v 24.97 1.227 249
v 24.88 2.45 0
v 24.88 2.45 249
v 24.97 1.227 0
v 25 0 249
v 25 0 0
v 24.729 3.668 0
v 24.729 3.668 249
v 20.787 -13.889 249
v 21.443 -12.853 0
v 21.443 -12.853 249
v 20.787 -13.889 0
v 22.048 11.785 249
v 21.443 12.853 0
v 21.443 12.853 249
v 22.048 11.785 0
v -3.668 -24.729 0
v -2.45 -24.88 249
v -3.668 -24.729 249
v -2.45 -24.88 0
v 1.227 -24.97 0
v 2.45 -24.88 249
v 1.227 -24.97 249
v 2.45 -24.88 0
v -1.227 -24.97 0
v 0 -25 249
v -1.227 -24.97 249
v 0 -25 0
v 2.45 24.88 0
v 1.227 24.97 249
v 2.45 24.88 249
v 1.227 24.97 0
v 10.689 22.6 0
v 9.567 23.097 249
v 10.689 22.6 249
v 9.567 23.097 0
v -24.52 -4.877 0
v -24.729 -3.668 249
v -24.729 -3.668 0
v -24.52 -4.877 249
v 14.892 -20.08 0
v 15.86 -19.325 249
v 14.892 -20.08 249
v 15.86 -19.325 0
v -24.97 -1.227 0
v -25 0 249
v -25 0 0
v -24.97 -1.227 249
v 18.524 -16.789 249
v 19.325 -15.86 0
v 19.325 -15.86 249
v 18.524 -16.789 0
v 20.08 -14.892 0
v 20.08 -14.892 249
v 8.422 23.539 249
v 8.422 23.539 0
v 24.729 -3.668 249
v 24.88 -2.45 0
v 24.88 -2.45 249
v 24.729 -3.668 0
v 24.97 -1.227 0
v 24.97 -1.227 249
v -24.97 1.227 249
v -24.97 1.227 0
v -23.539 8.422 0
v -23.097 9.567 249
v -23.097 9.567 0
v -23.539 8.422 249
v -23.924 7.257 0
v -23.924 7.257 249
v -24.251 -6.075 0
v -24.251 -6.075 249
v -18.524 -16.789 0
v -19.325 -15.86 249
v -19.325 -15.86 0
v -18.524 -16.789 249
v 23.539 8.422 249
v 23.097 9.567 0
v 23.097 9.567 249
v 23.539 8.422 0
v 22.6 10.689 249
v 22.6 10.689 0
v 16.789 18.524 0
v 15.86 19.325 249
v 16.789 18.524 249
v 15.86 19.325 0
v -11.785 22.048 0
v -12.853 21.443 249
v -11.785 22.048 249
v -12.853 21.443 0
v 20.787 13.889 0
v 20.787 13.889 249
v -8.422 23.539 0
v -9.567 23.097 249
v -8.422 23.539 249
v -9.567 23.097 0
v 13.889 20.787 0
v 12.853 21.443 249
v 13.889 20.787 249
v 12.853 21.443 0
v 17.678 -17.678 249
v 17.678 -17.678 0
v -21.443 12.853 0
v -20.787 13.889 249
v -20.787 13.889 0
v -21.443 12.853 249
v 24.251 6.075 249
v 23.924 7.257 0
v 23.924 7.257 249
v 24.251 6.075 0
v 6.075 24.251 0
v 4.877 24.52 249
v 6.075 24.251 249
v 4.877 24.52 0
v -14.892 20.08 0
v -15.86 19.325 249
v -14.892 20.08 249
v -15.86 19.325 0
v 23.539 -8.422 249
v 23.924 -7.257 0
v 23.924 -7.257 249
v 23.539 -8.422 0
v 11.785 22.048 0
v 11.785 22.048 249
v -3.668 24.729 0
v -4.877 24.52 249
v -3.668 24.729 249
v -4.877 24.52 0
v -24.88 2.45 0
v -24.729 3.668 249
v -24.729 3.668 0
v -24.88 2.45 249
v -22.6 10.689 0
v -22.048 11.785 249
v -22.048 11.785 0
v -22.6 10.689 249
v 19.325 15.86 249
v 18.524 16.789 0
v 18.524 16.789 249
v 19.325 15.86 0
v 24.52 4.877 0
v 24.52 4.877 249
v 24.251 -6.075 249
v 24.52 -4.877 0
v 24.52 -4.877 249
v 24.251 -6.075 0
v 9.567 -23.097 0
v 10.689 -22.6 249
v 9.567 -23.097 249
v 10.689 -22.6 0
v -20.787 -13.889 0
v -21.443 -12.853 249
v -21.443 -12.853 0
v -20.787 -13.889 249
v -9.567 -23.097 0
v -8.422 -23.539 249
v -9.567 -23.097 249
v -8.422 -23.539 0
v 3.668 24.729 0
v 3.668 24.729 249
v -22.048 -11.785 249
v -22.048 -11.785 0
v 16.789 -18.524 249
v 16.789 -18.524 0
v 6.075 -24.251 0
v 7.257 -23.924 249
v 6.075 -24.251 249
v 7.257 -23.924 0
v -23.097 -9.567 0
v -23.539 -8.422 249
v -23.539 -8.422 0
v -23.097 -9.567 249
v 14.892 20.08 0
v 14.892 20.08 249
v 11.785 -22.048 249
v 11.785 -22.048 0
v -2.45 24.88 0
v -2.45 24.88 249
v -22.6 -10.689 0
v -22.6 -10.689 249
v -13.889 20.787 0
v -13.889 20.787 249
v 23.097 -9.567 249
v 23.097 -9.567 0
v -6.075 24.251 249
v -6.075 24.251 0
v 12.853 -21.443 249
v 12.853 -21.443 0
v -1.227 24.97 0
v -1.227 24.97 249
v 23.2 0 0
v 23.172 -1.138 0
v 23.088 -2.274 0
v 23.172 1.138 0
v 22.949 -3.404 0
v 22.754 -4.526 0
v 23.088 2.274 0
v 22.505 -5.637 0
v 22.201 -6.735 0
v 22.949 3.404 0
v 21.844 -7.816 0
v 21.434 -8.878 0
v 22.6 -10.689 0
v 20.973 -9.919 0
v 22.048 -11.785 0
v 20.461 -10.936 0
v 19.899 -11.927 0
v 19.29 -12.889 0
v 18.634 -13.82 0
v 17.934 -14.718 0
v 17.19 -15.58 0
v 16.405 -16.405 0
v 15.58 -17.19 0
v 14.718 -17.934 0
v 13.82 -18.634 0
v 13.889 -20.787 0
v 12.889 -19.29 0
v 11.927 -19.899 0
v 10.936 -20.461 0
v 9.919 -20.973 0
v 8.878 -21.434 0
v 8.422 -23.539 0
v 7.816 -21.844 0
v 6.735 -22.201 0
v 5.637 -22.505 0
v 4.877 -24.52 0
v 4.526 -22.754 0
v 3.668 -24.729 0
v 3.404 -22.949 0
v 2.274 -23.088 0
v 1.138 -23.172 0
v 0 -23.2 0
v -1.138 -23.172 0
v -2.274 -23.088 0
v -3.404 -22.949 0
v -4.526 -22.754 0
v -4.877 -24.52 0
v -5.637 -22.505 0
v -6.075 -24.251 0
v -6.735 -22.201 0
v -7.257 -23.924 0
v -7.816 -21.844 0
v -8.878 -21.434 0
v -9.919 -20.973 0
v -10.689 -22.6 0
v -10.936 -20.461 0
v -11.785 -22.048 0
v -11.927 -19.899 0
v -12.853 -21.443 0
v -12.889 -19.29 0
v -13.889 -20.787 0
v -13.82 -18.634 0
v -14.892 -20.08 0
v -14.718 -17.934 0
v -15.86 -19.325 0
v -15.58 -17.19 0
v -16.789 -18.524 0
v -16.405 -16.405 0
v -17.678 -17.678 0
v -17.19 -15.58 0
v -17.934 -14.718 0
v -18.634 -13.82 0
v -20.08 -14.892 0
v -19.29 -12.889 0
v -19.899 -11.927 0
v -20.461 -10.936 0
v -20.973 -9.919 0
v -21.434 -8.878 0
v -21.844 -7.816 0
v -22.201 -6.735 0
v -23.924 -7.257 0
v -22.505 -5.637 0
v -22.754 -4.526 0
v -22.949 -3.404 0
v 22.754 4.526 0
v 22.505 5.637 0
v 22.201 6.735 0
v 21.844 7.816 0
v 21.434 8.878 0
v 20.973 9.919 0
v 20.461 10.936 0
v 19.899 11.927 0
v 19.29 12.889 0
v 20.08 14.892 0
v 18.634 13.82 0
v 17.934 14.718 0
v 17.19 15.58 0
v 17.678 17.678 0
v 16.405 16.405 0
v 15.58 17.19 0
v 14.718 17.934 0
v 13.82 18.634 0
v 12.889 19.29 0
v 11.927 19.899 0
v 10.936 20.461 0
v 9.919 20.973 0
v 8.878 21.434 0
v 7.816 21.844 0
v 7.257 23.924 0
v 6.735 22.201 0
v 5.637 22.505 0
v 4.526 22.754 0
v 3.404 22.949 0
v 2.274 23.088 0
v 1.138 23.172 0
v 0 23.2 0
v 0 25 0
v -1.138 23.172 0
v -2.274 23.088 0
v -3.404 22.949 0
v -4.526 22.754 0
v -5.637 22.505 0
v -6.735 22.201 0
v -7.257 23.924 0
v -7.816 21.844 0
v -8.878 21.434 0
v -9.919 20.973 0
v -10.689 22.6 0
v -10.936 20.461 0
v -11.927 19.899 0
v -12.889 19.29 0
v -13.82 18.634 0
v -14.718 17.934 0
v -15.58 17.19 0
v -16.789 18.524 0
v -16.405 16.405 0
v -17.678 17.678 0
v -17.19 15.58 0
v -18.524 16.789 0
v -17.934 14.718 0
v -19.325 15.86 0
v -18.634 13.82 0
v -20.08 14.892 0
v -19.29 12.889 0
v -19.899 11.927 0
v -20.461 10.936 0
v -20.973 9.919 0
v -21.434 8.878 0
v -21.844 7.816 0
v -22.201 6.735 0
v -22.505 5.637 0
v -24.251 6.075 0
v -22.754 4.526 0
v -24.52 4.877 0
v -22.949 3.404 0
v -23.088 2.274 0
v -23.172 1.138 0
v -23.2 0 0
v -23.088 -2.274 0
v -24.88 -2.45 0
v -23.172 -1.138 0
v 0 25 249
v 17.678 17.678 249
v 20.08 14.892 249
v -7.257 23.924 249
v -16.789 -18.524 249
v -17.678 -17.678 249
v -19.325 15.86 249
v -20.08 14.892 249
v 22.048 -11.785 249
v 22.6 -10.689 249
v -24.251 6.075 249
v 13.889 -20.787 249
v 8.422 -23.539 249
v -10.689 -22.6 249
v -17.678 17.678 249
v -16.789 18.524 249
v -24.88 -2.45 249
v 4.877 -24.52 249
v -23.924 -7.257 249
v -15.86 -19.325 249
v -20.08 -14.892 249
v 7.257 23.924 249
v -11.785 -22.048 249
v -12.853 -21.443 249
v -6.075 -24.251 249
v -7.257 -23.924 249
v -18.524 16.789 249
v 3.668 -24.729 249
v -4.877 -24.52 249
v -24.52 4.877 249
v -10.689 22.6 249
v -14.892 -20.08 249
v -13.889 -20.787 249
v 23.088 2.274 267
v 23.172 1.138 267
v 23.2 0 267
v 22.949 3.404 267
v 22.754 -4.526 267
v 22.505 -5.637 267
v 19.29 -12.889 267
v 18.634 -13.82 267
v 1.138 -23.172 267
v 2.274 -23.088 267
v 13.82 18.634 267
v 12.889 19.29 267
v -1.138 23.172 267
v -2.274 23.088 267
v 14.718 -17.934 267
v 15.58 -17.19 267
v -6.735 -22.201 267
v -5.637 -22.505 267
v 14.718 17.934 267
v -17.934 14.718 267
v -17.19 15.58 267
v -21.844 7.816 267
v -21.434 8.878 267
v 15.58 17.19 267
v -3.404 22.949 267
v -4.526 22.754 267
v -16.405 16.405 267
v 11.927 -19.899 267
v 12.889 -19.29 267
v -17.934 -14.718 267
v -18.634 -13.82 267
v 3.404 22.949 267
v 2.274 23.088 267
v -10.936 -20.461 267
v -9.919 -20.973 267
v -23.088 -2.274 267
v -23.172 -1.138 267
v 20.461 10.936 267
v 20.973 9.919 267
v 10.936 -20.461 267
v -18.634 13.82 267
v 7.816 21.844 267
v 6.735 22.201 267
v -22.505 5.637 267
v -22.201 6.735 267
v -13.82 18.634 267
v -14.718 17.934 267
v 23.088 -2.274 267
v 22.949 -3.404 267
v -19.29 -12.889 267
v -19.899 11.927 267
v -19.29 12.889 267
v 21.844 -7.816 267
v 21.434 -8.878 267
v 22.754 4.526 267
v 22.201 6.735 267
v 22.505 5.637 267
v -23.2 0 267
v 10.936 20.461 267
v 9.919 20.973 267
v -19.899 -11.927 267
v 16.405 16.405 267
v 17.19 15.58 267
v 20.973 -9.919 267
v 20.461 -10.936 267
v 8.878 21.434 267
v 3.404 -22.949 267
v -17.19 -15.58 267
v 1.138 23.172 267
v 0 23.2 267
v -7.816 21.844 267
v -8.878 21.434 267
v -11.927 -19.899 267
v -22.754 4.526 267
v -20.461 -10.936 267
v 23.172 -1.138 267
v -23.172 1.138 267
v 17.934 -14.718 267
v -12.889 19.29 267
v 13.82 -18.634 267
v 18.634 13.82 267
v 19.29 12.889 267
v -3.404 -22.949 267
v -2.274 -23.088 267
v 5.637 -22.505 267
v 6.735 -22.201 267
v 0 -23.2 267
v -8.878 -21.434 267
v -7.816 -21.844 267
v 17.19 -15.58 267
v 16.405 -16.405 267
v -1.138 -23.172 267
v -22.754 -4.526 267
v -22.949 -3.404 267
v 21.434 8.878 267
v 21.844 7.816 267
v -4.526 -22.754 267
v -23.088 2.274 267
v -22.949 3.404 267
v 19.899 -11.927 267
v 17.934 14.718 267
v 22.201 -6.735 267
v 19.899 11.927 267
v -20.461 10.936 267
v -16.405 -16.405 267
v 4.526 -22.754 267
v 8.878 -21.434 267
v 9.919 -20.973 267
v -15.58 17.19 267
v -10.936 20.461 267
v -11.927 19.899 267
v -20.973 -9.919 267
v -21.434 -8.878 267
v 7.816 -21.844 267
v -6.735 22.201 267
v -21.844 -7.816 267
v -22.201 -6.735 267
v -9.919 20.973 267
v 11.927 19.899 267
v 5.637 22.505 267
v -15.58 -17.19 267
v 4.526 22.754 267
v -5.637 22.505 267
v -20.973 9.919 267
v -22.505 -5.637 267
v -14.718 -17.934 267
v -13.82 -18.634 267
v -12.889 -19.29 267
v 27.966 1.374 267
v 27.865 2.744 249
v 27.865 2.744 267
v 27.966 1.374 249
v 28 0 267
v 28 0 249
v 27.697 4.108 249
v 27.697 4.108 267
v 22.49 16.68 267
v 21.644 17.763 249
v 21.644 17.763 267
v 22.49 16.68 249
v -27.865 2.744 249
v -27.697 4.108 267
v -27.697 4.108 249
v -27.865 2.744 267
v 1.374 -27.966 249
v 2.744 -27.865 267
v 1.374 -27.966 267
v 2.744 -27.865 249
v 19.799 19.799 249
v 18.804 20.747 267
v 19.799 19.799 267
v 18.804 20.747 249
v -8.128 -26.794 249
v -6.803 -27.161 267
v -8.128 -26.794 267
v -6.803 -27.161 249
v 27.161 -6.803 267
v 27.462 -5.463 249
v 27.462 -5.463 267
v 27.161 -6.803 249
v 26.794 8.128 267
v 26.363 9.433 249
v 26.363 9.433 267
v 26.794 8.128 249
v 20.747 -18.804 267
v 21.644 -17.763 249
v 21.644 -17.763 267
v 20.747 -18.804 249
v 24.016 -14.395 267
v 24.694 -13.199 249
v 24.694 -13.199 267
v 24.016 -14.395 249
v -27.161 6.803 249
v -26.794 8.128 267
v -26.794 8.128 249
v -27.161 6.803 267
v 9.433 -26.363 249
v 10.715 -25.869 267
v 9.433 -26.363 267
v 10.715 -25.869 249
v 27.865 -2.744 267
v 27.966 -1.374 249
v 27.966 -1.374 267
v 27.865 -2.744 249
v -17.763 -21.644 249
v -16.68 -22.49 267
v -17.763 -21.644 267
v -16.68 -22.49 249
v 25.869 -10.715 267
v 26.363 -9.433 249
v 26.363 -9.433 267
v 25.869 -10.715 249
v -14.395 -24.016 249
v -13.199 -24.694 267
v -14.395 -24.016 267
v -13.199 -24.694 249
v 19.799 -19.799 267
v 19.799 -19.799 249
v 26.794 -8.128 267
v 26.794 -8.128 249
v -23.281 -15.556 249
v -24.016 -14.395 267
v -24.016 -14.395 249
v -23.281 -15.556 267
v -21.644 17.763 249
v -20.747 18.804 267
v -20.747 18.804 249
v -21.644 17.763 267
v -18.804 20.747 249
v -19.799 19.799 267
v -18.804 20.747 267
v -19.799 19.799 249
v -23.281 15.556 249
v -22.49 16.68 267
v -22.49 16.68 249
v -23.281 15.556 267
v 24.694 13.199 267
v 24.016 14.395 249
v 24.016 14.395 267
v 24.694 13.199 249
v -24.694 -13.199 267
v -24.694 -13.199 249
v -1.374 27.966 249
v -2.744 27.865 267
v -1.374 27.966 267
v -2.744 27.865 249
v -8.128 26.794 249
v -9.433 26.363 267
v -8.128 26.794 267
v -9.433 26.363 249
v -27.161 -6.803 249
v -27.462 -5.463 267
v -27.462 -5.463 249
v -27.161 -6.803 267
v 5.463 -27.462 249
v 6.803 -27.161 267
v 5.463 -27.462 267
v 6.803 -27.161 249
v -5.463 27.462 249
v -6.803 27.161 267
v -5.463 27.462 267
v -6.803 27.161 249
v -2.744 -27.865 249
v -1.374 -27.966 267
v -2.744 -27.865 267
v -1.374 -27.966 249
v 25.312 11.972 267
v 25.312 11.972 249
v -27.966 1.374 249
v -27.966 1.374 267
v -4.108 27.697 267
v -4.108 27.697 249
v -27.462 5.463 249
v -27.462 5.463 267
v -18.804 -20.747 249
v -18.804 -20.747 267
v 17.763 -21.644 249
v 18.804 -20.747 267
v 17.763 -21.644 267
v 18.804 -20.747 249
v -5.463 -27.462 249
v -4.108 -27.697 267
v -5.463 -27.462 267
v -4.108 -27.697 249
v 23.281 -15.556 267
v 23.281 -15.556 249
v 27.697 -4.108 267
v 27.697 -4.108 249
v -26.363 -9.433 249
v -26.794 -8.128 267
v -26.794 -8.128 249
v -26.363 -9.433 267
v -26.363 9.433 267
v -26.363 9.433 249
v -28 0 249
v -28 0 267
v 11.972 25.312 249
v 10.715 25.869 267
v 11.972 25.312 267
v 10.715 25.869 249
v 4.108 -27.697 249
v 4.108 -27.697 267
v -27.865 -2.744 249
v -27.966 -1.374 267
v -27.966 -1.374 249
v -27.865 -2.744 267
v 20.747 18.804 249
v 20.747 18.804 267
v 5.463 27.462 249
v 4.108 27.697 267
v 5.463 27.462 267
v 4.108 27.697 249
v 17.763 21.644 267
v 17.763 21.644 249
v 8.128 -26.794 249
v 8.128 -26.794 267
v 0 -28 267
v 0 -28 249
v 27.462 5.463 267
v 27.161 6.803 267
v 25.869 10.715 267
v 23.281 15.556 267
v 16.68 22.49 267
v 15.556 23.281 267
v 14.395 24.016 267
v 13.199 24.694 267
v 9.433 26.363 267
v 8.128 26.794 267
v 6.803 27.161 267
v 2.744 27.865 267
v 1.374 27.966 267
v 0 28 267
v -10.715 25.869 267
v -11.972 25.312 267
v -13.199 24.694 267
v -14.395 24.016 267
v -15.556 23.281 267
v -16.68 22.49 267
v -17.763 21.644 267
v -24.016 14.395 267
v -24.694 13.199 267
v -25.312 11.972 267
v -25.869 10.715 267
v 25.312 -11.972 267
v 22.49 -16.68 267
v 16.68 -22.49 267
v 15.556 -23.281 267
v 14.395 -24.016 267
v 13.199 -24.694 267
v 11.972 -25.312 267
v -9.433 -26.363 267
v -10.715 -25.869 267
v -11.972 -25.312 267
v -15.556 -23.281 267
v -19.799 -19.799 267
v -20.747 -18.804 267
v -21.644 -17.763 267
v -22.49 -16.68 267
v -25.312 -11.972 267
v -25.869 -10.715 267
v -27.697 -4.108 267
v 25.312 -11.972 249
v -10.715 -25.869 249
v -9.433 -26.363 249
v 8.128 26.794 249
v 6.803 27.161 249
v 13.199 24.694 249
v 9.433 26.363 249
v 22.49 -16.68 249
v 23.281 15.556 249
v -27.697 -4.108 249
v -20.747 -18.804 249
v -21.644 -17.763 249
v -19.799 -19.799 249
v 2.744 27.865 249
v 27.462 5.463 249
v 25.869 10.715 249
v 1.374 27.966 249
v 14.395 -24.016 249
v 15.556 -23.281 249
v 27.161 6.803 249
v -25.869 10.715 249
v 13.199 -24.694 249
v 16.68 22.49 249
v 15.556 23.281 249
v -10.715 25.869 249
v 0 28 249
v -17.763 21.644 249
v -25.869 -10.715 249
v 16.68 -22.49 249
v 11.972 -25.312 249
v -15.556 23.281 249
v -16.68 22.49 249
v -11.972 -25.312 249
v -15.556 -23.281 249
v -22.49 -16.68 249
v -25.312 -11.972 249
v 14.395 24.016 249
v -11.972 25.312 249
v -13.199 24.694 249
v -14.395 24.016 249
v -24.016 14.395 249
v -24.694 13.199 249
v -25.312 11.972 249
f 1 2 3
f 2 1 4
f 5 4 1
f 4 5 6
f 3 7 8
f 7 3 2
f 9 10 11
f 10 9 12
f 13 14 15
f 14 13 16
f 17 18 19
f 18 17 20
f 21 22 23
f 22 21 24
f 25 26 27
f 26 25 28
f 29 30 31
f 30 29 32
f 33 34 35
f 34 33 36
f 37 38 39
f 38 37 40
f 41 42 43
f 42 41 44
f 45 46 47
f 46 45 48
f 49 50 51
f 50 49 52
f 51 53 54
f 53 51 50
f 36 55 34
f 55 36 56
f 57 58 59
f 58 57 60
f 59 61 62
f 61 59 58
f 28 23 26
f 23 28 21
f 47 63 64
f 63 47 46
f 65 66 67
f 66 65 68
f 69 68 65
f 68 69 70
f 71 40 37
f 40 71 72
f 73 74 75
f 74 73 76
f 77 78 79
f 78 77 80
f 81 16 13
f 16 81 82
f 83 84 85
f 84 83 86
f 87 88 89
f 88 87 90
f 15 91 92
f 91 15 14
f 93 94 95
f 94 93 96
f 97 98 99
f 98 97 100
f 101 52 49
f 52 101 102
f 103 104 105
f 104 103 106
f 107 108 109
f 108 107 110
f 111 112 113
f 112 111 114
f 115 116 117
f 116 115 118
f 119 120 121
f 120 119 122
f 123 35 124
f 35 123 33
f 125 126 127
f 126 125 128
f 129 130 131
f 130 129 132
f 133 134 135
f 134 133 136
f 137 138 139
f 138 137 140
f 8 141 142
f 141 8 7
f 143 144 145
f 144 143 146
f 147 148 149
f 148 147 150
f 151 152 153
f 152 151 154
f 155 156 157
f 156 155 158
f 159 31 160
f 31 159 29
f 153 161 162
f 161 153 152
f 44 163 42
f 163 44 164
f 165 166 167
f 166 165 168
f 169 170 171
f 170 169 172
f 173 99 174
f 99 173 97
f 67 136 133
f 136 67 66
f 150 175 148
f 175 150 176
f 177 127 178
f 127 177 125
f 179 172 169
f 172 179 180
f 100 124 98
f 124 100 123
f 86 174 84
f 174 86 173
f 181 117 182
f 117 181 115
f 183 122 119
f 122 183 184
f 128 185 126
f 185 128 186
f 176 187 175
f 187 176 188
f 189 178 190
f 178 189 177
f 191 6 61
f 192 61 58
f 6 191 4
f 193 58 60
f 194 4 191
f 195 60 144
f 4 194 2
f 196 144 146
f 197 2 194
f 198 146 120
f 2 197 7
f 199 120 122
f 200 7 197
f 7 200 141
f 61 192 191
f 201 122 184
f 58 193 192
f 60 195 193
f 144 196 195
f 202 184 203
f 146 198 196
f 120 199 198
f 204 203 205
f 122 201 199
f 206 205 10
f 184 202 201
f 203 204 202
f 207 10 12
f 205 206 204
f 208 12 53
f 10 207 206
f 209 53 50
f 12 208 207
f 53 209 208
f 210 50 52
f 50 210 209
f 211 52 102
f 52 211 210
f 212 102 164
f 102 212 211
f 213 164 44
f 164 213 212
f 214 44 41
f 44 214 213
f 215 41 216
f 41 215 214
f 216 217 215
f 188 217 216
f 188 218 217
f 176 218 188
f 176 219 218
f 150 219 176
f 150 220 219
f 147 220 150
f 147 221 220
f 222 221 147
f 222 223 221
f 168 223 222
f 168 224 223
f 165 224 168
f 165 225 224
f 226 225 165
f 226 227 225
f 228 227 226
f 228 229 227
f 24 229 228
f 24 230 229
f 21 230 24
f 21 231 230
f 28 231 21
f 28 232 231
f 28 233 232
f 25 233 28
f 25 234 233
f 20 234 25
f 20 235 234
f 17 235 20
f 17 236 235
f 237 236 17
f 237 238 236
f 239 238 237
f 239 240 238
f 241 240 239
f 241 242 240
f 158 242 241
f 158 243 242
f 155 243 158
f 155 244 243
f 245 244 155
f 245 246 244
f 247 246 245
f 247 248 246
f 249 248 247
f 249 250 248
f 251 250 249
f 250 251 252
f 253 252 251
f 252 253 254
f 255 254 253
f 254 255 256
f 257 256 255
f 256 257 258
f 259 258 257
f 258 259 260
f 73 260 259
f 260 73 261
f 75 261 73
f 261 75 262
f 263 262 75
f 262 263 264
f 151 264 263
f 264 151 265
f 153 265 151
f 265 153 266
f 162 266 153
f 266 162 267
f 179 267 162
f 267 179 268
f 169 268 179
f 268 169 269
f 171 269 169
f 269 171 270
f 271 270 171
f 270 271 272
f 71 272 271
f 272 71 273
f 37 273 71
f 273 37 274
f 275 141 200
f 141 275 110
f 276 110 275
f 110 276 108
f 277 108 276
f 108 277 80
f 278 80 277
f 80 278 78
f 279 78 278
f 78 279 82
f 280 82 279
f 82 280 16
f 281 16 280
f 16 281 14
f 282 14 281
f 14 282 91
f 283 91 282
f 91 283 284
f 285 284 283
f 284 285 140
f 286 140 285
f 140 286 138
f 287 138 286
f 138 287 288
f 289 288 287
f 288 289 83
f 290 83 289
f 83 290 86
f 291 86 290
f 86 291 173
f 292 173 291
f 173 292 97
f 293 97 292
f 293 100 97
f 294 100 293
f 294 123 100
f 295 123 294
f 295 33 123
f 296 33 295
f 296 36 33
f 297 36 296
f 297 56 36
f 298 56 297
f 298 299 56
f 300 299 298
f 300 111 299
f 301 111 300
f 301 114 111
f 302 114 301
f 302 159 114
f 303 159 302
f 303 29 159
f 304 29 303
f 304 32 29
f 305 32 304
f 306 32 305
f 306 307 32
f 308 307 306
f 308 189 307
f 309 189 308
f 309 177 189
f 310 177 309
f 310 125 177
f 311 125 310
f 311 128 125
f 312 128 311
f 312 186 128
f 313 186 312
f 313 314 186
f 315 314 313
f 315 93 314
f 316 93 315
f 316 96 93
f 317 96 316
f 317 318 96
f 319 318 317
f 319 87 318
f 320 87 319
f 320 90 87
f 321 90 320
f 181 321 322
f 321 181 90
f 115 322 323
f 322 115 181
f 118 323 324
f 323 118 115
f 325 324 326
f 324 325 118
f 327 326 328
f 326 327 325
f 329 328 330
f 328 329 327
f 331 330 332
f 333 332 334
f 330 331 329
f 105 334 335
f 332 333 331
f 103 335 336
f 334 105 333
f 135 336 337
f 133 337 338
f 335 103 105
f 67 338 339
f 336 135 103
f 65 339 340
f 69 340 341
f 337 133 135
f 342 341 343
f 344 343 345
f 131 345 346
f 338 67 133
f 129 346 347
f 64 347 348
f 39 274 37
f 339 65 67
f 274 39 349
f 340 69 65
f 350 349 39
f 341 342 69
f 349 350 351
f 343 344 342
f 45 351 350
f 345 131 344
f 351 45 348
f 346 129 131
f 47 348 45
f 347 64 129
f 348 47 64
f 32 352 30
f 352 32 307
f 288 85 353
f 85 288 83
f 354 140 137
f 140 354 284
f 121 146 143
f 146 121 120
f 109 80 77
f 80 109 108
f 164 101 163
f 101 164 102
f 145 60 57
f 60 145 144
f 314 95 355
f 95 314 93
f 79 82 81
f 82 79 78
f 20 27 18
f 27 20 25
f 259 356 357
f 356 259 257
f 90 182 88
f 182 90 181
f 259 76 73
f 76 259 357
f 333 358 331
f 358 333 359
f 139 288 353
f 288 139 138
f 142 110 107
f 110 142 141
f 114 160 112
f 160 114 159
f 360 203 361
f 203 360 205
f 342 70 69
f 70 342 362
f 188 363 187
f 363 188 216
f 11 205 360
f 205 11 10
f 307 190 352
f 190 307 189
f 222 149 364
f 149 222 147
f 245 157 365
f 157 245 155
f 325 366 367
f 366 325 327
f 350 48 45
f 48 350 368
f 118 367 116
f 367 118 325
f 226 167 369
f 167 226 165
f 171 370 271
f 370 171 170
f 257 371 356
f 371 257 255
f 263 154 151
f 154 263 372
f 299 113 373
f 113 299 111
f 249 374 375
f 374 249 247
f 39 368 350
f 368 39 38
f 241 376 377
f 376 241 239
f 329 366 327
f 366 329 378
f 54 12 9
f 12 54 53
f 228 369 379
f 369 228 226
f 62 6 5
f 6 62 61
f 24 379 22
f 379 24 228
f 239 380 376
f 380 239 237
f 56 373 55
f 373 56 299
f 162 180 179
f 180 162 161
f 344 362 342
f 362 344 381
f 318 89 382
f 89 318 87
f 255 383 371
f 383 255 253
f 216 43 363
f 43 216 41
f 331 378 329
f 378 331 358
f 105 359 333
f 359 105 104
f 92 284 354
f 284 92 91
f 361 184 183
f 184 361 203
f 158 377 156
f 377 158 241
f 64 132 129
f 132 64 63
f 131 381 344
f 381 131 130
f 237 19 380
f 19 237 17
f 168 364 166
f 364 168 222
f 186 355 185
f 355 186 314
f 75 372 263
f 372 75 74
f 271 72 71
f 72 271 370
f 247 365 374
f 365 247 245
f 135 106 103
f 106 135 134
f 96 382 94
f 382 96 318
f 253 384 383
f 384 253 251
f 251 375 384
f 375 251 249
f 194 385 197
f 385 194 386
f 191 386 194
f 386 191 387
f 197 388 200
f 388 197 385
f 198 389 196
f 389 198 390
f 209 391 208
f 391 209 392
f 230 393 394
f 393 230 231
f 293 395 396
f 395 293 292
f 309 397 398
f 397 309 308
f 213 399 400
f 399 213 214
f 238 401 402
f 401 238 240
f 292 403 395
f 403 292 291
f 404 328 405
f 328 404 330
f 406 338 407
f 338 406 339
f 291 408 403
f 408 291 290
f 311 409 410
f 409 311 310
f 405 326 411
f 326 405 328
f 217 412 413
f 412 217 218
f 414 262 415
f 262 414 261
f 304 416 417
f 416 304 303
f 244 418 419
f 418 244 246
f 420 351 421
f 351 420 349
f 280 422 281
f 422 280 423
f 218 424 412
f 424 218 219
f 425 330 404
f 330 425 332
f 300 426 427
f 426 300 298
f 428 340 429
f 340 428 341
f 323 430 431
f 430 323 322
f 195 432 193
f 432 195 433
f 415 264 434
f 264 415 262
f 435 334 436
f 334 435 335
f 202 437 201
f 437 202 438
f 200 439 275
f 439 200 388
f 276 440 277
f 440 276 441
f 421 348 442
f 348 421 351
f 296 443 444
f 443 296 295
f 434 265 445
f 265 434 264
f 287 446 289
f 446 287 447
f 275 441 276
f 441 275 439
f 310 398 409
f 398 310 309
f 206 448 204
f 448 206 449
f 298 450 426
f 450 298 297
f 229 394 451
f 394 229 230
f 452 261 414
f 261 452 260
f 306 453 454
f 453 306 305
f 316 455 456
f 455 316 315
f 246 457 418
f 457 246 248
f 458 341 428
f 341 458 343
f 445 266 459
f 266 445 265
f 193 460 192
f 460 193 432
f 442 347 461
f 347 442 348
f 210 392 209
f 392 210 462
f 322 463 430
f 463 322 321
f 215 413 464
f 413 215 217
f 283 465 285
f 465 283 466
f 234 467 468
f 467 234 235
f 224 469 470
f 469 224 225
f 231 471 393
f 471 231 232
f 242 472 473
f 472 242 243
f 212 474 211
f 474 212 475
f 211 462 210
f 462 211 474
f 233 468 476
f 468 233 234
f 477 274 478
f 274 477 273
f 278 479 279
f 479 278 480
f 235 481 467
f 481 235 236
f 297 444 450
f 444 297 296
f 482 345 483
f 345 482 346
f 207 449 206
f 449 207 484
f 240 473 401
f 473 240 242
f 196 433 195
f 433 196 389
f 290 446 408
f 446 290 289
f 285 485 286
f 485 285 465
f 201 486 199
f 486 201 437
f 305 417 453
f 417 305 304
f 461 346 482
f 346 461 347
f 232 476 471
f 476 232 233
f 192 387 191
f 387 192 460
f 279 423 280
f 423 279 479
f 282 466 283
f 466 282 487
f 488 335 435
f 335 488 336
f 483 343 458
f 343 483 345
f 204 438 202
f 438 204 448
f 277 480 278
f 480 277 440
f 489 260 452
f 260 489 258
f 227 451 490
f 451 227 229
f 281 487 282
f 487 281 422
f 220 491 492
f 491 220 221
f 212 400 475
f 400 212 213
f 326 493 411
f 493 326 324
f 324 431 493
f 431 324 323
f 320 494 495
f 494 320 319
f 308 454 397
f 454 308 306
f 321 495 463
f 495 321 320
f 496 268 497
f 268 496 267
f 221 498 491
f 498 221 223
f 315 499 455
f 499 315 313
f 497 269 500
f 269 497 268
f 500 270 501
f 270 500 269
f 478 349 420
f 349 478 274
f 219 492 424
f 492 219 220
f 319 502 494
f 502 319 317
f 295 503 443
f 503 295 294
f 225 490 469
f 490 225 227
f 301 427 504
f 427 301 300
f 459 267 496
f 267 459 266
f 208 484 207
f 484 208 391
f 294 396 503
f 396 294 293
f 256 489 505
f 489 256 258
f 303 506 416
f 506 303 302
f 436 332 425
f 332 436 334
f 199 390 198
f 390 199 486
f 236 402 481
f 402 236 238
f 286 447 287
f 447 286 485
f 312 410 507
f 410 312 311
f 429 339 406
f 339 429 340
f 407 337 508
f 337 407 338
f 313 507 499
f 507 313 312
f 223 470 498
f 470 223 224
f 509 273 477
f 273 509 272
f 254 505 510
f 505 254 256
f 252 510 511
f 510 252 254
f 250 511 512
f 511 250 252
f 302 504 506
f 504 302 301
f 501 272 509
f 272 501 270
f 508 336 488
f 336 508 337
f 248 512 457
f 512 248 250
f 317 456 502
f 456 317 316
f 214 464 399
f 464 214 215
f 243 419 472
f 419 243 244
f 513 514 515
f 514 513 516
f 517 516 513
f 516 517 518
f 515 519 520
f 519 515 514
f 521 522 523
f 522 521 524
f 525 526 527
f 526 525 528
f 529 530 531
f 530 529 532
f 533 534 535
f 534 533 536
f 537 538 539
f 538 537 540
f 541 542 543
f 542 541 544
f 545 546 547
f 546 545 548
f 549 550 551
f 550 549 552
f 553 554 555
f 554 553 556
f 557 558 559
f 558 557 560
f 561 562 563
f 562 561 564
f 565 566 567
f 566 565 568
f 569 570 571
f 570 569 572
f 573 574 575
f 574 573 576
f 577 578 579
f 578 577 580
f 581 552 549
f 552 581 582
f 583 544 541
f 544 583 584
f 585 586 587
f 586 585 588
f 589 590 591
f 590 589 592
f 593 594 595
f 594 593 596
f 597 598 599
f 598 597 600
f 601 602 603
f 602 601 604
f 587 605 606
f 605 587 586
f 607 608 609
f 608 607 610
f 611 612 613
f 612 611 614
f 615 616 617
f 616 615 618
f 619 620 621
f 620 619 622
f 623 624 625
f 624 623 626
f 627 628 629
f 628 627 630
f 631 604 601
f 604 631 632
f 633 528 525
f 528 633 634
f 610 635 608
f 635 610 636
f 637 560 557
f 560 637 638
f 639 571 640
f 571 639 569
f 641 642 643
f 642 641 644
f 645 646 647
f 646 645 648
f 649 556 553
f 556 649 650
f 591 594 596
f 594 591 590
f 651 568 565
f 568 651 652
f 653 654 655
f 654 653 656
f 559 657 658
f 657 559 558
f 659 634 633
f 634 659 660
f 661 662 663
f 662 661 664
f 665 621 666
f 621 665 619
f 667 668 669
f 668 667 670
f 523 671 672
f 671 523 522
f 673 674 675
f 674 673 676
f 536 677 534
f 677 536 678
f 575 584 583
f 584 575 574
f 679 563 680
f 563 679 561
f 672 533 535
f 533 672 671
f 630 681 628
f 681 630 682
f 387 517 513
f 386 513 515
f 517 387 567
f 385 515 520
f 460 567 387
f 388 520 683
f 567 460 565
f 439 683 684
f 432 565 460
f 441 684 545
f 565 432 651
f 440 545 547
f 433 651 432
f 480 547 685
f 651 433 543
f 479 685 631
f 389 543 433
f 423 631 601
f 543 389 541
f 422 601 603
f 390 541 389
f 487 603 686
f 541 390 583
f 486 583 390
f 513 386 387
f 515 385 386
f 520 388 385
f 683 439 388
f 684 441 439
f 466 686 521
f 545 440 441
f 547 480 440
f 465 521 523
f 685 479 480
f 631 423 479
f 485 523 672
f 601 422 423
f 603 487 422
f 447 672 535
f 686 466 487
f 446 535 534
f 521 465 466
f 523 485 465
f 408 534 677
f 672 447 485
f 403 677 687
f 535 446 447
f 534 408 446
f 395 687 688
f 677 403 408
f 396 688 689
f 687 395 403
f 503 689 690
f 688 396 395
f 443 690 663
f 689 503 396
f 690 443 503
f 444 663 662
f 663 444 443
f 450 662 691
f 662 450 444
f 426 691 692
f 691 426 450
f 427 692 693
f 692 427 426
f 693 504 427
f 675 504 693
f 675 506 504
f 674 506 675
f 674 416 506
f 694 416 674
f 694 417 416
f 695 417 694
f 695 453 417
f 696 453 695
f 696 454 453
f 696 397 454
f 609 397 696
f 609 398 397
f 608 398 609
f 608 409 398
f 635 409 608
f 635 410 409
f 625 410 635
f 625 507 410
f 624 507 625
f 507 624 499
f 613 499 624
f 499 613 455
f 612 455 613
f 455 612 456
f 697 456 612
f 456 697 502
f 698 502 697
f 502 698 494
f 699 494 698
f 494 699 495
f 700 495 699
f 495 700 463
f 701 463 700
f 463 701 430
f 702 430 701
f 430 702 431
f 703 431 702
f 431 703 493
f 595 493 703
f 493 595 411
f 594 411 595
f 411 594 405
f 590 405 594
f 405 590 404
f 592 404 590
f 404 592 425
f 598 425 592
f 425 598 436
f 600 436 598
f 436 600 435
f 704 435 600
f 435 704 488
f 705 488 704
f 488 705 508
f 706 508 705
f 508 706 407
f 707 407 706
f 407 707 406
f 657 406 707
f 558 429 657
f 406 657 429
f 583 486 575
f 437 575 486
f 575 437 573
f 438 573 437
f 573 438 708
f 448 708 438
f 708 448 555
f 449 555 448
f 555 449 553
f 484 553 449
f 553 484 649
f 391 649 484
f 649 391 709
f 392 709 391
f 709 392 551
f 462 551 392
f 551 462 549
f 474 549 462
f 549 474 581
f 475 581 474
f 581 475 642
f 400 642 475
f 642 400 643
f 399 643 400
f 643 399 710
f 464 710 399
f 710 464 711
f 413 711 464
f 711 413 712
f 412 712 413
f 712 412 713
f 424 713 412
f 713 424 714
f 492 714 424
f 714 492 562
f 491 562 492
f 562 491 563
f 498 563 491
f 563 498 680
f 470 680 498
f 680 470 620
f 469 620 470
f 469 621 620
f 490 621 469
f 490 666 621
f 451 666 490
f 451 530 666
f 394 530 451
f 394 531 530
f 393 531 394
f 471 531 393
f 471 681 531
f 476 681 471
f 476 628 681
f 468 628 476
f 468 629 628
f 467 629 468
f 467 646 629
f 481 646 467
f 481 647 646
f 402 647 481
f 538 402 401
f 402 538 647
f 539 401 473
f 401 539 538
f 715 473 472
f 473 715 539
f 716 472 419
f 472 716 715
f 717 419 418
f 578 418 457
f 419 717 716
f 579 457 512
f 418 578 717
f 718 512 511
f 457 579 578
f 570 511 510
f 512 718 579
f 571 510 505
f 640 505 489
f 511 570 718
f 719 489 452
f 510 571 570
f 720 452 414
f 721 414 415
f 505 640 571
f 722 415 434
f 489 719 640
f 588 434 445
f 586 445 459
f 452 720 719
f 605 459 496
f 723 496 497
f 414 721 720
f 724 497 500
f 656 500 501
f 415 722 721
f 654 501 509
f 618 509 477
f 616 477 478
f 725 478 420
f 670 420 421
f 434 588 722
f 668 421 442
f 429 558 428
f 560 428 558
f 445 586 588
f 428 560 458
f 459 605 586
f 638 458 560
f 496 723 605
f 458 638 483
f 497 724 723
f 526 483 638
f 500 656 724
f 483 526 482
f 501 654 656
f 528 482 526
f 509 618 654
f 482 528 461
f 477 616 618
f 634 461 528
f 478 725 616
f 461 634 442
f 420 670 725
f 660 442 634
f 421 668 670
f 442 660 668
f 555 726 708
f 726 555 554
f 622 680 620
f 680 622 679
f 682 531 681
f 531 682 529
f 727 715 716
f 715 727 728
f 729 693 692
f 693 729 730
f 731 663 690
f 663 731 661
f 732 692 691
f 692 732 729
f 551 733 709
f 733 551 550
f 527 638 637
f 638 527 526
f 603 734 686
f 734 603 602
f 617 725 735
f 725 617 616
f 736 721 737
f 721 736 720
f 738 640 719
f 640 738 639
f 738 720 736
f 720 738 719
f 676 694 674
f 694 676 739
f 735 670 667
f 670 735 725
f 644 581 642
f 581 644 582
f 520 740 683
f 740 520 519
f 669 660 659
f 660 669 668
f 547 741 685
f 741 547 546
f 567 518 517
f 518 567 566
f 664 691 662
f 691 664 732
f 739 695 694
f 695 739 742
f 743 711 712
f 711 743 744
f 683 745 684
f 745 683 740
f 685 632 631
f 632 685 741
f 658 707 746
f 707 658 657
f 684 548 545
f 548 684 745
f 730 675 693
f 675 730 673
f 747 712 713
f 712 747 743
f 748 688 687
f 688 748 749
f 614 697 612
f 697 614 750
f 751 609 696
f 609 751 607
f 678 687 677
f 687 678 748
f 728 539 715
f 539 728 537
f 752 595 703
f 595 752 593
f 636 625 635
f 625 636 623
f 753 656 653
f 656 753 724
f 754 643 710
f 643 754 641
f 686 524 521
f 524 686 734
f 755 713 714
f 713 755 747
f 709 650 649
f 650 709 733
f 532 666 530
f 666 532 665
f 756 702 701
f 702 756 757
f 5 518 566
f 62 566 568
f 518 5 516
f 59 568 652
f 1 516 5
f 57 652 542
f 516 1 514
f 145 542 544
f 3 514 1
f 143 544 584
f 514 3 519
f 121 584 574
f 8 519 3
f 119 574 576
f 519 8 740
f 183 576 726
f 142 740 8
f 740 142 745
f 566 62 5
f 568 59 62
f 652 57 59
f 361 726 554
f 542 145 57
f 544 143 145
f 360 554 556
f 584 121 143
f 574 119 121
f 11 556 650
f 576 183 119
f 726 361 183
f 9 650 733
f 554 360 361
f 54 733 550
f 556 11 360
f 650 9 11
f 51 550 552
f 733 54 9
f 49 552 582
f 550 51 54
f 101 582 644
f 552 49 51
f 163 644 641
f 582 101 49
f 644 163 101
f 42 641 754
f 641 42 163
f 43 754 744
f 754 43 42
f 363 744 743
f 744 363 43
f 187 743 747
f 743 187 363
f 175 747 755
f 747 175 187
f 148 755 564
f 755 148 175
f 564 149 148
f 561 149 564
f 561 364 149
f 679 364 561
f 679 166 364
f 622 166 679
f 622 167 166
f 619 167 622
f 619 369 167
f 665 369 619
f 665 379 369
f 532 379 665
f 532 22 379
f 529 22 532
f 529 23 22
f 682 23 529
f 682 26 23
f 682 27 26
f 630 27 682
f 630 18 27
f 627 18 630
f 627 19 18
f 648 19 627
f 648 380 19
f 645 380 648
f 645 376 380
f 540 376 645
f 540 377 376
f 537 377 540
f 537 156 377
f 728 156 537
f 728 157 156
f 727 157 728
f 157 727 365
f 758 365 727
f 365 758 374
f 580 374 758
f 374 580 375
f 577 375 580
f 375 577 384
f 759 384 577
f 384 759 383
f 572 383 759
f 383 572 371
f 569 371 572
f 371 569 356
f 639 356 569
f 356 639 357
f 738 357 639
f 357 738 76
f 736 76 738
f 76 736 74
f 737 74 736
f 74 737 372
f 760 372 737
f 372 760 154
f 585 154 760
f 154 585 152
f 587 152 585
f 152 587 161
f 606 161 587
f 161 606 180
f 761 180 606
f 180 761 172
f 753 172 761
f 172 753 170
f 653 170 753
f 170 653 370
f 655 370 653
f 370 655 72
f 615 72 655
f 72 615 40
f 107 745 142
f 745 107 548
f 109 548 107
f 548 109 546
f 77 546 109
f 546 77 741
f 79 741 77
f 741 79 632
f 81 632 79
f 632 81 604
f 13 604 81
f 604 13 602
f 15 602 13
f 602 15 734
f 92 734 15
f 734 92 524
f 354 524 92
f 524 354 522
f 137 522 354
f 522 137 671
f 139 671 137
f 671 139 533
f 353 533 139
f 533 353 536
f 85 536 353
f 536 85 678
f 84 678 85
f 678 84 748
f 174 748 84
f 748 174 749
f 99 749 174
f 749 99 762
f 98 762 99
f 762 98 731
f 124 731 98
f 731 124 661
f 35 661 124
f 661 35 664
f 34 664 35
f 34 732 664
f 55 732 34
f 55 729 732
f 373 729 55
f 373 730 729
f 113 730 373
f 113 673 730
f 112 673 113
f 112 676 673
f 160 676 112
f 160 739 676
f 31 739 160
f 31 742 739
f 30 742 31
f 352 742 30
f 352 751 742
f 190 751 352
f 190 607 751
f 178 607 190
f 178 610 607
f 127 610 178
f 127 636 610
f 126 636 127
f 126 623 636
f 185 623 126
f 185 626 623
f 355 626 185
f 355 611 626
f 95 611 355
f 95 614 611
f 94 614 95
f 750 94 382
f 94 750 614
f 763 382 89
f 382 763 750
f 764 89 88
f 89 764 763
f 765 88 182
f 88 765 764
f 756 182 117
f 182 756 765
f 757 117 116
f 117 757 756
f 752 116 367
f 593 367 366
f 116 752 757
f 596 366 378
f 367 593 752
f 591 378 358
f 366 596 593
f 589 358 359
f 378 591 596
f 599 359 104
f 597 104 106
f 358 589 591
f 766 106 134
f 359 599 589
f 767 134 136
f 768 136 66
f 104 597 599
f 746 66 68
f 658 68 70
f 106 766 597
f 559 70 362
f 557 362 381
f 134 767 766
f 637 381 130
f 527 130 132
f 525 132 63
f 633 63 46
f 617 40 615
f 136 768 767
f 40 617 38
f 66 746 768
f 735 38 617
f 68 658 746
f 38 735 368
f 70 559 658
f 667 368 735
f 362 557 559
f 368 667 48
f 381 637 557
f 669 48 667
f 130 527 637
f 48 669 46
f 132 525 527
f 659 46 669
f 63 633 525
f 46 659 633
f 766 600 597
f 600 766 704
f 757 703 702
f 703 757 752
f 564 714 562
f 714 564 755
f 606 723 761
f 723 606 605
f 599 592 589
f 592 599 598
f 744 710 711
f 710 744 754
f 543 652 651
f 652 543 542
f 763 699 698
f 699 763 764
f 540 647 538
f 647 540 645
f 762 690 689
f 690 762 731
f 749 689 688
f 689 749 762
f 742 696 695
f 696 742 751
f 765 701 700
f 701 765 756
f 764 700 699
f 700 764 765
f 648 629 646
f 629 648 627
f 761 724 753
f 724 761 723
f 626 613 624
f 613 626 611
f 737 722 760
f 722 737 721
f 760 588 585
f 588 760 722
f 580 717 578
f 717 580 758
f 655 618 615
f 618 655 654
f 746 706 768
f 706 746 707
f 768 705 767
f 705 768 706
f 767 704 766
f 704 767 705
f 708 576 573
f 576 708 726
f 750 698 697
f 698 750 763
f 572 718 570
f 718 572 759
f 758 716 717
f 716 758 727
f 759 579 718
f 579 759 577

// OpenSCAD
// HT 50 pipe, 250 mm long (with optional end socket)
// One connected solid, no arbitrary translations.

$fn = 128;

// Parameters
length_mm = 250;                 // [125:500:1]
ht50_outer_diameter = 50;        // [40:80:0.5]
wall_thickness = 1.8;            // [1:4:0.1]
include_end_fitting = 1;         // [0:1:1]
fitting_length = 18;             // [10:40:1]
fitting_radial_thickness = 3;    // [1:8:0.5]
overlap = 1;                     // [0.5:2:0.1]

// Derived
outer_r = ht50_outer_diameter/2;
inner_r = outer_r - wall_thickness;
fitting_outer_r = outer_r + fitting_radial_thickness;

// Safety
inner_r_safe = max(0.01, inner_r);
overlap_safe = max(0.01, overlap);

// Pipe wall (hollow)
module ht_pipe_segment() {
    difference() {
        cylinder(h=length_mm, r=outer_r, center=false);
        translate([0, 0, -overlap_safe])
            cylinder(h=length_mm + 2*overlap_safe, r=inner_r_safe, center=false);
    }
}

// End socket (thickened outer ring) that overlaps the pipe to ensure connectivity
module end_fitting() {
    if (include_end_fitting) {
        z0 = length_mm - overlap_safe; // overlap into pipe by overlap_safe

        difference() {
            translate([0, 0, z0])
                cylinder(h=fitting_length, r=fitting_outer_r, center=false);

            // Keep bore continuous through fitting; extend a bit to avoid coplanar faces
            translate([0, 0, z0 - overlap_safe])
                cylinder(h=fitting_length + 2*overlap_safe, r=inner_r_safe, center=false);
        }
    }
}

// Complete HT pipe (single connected solid)
module ht_pipe() {
    union() {
        ht_pipe_segment();
        end_fitting();
    }
}

ht_pipe();
